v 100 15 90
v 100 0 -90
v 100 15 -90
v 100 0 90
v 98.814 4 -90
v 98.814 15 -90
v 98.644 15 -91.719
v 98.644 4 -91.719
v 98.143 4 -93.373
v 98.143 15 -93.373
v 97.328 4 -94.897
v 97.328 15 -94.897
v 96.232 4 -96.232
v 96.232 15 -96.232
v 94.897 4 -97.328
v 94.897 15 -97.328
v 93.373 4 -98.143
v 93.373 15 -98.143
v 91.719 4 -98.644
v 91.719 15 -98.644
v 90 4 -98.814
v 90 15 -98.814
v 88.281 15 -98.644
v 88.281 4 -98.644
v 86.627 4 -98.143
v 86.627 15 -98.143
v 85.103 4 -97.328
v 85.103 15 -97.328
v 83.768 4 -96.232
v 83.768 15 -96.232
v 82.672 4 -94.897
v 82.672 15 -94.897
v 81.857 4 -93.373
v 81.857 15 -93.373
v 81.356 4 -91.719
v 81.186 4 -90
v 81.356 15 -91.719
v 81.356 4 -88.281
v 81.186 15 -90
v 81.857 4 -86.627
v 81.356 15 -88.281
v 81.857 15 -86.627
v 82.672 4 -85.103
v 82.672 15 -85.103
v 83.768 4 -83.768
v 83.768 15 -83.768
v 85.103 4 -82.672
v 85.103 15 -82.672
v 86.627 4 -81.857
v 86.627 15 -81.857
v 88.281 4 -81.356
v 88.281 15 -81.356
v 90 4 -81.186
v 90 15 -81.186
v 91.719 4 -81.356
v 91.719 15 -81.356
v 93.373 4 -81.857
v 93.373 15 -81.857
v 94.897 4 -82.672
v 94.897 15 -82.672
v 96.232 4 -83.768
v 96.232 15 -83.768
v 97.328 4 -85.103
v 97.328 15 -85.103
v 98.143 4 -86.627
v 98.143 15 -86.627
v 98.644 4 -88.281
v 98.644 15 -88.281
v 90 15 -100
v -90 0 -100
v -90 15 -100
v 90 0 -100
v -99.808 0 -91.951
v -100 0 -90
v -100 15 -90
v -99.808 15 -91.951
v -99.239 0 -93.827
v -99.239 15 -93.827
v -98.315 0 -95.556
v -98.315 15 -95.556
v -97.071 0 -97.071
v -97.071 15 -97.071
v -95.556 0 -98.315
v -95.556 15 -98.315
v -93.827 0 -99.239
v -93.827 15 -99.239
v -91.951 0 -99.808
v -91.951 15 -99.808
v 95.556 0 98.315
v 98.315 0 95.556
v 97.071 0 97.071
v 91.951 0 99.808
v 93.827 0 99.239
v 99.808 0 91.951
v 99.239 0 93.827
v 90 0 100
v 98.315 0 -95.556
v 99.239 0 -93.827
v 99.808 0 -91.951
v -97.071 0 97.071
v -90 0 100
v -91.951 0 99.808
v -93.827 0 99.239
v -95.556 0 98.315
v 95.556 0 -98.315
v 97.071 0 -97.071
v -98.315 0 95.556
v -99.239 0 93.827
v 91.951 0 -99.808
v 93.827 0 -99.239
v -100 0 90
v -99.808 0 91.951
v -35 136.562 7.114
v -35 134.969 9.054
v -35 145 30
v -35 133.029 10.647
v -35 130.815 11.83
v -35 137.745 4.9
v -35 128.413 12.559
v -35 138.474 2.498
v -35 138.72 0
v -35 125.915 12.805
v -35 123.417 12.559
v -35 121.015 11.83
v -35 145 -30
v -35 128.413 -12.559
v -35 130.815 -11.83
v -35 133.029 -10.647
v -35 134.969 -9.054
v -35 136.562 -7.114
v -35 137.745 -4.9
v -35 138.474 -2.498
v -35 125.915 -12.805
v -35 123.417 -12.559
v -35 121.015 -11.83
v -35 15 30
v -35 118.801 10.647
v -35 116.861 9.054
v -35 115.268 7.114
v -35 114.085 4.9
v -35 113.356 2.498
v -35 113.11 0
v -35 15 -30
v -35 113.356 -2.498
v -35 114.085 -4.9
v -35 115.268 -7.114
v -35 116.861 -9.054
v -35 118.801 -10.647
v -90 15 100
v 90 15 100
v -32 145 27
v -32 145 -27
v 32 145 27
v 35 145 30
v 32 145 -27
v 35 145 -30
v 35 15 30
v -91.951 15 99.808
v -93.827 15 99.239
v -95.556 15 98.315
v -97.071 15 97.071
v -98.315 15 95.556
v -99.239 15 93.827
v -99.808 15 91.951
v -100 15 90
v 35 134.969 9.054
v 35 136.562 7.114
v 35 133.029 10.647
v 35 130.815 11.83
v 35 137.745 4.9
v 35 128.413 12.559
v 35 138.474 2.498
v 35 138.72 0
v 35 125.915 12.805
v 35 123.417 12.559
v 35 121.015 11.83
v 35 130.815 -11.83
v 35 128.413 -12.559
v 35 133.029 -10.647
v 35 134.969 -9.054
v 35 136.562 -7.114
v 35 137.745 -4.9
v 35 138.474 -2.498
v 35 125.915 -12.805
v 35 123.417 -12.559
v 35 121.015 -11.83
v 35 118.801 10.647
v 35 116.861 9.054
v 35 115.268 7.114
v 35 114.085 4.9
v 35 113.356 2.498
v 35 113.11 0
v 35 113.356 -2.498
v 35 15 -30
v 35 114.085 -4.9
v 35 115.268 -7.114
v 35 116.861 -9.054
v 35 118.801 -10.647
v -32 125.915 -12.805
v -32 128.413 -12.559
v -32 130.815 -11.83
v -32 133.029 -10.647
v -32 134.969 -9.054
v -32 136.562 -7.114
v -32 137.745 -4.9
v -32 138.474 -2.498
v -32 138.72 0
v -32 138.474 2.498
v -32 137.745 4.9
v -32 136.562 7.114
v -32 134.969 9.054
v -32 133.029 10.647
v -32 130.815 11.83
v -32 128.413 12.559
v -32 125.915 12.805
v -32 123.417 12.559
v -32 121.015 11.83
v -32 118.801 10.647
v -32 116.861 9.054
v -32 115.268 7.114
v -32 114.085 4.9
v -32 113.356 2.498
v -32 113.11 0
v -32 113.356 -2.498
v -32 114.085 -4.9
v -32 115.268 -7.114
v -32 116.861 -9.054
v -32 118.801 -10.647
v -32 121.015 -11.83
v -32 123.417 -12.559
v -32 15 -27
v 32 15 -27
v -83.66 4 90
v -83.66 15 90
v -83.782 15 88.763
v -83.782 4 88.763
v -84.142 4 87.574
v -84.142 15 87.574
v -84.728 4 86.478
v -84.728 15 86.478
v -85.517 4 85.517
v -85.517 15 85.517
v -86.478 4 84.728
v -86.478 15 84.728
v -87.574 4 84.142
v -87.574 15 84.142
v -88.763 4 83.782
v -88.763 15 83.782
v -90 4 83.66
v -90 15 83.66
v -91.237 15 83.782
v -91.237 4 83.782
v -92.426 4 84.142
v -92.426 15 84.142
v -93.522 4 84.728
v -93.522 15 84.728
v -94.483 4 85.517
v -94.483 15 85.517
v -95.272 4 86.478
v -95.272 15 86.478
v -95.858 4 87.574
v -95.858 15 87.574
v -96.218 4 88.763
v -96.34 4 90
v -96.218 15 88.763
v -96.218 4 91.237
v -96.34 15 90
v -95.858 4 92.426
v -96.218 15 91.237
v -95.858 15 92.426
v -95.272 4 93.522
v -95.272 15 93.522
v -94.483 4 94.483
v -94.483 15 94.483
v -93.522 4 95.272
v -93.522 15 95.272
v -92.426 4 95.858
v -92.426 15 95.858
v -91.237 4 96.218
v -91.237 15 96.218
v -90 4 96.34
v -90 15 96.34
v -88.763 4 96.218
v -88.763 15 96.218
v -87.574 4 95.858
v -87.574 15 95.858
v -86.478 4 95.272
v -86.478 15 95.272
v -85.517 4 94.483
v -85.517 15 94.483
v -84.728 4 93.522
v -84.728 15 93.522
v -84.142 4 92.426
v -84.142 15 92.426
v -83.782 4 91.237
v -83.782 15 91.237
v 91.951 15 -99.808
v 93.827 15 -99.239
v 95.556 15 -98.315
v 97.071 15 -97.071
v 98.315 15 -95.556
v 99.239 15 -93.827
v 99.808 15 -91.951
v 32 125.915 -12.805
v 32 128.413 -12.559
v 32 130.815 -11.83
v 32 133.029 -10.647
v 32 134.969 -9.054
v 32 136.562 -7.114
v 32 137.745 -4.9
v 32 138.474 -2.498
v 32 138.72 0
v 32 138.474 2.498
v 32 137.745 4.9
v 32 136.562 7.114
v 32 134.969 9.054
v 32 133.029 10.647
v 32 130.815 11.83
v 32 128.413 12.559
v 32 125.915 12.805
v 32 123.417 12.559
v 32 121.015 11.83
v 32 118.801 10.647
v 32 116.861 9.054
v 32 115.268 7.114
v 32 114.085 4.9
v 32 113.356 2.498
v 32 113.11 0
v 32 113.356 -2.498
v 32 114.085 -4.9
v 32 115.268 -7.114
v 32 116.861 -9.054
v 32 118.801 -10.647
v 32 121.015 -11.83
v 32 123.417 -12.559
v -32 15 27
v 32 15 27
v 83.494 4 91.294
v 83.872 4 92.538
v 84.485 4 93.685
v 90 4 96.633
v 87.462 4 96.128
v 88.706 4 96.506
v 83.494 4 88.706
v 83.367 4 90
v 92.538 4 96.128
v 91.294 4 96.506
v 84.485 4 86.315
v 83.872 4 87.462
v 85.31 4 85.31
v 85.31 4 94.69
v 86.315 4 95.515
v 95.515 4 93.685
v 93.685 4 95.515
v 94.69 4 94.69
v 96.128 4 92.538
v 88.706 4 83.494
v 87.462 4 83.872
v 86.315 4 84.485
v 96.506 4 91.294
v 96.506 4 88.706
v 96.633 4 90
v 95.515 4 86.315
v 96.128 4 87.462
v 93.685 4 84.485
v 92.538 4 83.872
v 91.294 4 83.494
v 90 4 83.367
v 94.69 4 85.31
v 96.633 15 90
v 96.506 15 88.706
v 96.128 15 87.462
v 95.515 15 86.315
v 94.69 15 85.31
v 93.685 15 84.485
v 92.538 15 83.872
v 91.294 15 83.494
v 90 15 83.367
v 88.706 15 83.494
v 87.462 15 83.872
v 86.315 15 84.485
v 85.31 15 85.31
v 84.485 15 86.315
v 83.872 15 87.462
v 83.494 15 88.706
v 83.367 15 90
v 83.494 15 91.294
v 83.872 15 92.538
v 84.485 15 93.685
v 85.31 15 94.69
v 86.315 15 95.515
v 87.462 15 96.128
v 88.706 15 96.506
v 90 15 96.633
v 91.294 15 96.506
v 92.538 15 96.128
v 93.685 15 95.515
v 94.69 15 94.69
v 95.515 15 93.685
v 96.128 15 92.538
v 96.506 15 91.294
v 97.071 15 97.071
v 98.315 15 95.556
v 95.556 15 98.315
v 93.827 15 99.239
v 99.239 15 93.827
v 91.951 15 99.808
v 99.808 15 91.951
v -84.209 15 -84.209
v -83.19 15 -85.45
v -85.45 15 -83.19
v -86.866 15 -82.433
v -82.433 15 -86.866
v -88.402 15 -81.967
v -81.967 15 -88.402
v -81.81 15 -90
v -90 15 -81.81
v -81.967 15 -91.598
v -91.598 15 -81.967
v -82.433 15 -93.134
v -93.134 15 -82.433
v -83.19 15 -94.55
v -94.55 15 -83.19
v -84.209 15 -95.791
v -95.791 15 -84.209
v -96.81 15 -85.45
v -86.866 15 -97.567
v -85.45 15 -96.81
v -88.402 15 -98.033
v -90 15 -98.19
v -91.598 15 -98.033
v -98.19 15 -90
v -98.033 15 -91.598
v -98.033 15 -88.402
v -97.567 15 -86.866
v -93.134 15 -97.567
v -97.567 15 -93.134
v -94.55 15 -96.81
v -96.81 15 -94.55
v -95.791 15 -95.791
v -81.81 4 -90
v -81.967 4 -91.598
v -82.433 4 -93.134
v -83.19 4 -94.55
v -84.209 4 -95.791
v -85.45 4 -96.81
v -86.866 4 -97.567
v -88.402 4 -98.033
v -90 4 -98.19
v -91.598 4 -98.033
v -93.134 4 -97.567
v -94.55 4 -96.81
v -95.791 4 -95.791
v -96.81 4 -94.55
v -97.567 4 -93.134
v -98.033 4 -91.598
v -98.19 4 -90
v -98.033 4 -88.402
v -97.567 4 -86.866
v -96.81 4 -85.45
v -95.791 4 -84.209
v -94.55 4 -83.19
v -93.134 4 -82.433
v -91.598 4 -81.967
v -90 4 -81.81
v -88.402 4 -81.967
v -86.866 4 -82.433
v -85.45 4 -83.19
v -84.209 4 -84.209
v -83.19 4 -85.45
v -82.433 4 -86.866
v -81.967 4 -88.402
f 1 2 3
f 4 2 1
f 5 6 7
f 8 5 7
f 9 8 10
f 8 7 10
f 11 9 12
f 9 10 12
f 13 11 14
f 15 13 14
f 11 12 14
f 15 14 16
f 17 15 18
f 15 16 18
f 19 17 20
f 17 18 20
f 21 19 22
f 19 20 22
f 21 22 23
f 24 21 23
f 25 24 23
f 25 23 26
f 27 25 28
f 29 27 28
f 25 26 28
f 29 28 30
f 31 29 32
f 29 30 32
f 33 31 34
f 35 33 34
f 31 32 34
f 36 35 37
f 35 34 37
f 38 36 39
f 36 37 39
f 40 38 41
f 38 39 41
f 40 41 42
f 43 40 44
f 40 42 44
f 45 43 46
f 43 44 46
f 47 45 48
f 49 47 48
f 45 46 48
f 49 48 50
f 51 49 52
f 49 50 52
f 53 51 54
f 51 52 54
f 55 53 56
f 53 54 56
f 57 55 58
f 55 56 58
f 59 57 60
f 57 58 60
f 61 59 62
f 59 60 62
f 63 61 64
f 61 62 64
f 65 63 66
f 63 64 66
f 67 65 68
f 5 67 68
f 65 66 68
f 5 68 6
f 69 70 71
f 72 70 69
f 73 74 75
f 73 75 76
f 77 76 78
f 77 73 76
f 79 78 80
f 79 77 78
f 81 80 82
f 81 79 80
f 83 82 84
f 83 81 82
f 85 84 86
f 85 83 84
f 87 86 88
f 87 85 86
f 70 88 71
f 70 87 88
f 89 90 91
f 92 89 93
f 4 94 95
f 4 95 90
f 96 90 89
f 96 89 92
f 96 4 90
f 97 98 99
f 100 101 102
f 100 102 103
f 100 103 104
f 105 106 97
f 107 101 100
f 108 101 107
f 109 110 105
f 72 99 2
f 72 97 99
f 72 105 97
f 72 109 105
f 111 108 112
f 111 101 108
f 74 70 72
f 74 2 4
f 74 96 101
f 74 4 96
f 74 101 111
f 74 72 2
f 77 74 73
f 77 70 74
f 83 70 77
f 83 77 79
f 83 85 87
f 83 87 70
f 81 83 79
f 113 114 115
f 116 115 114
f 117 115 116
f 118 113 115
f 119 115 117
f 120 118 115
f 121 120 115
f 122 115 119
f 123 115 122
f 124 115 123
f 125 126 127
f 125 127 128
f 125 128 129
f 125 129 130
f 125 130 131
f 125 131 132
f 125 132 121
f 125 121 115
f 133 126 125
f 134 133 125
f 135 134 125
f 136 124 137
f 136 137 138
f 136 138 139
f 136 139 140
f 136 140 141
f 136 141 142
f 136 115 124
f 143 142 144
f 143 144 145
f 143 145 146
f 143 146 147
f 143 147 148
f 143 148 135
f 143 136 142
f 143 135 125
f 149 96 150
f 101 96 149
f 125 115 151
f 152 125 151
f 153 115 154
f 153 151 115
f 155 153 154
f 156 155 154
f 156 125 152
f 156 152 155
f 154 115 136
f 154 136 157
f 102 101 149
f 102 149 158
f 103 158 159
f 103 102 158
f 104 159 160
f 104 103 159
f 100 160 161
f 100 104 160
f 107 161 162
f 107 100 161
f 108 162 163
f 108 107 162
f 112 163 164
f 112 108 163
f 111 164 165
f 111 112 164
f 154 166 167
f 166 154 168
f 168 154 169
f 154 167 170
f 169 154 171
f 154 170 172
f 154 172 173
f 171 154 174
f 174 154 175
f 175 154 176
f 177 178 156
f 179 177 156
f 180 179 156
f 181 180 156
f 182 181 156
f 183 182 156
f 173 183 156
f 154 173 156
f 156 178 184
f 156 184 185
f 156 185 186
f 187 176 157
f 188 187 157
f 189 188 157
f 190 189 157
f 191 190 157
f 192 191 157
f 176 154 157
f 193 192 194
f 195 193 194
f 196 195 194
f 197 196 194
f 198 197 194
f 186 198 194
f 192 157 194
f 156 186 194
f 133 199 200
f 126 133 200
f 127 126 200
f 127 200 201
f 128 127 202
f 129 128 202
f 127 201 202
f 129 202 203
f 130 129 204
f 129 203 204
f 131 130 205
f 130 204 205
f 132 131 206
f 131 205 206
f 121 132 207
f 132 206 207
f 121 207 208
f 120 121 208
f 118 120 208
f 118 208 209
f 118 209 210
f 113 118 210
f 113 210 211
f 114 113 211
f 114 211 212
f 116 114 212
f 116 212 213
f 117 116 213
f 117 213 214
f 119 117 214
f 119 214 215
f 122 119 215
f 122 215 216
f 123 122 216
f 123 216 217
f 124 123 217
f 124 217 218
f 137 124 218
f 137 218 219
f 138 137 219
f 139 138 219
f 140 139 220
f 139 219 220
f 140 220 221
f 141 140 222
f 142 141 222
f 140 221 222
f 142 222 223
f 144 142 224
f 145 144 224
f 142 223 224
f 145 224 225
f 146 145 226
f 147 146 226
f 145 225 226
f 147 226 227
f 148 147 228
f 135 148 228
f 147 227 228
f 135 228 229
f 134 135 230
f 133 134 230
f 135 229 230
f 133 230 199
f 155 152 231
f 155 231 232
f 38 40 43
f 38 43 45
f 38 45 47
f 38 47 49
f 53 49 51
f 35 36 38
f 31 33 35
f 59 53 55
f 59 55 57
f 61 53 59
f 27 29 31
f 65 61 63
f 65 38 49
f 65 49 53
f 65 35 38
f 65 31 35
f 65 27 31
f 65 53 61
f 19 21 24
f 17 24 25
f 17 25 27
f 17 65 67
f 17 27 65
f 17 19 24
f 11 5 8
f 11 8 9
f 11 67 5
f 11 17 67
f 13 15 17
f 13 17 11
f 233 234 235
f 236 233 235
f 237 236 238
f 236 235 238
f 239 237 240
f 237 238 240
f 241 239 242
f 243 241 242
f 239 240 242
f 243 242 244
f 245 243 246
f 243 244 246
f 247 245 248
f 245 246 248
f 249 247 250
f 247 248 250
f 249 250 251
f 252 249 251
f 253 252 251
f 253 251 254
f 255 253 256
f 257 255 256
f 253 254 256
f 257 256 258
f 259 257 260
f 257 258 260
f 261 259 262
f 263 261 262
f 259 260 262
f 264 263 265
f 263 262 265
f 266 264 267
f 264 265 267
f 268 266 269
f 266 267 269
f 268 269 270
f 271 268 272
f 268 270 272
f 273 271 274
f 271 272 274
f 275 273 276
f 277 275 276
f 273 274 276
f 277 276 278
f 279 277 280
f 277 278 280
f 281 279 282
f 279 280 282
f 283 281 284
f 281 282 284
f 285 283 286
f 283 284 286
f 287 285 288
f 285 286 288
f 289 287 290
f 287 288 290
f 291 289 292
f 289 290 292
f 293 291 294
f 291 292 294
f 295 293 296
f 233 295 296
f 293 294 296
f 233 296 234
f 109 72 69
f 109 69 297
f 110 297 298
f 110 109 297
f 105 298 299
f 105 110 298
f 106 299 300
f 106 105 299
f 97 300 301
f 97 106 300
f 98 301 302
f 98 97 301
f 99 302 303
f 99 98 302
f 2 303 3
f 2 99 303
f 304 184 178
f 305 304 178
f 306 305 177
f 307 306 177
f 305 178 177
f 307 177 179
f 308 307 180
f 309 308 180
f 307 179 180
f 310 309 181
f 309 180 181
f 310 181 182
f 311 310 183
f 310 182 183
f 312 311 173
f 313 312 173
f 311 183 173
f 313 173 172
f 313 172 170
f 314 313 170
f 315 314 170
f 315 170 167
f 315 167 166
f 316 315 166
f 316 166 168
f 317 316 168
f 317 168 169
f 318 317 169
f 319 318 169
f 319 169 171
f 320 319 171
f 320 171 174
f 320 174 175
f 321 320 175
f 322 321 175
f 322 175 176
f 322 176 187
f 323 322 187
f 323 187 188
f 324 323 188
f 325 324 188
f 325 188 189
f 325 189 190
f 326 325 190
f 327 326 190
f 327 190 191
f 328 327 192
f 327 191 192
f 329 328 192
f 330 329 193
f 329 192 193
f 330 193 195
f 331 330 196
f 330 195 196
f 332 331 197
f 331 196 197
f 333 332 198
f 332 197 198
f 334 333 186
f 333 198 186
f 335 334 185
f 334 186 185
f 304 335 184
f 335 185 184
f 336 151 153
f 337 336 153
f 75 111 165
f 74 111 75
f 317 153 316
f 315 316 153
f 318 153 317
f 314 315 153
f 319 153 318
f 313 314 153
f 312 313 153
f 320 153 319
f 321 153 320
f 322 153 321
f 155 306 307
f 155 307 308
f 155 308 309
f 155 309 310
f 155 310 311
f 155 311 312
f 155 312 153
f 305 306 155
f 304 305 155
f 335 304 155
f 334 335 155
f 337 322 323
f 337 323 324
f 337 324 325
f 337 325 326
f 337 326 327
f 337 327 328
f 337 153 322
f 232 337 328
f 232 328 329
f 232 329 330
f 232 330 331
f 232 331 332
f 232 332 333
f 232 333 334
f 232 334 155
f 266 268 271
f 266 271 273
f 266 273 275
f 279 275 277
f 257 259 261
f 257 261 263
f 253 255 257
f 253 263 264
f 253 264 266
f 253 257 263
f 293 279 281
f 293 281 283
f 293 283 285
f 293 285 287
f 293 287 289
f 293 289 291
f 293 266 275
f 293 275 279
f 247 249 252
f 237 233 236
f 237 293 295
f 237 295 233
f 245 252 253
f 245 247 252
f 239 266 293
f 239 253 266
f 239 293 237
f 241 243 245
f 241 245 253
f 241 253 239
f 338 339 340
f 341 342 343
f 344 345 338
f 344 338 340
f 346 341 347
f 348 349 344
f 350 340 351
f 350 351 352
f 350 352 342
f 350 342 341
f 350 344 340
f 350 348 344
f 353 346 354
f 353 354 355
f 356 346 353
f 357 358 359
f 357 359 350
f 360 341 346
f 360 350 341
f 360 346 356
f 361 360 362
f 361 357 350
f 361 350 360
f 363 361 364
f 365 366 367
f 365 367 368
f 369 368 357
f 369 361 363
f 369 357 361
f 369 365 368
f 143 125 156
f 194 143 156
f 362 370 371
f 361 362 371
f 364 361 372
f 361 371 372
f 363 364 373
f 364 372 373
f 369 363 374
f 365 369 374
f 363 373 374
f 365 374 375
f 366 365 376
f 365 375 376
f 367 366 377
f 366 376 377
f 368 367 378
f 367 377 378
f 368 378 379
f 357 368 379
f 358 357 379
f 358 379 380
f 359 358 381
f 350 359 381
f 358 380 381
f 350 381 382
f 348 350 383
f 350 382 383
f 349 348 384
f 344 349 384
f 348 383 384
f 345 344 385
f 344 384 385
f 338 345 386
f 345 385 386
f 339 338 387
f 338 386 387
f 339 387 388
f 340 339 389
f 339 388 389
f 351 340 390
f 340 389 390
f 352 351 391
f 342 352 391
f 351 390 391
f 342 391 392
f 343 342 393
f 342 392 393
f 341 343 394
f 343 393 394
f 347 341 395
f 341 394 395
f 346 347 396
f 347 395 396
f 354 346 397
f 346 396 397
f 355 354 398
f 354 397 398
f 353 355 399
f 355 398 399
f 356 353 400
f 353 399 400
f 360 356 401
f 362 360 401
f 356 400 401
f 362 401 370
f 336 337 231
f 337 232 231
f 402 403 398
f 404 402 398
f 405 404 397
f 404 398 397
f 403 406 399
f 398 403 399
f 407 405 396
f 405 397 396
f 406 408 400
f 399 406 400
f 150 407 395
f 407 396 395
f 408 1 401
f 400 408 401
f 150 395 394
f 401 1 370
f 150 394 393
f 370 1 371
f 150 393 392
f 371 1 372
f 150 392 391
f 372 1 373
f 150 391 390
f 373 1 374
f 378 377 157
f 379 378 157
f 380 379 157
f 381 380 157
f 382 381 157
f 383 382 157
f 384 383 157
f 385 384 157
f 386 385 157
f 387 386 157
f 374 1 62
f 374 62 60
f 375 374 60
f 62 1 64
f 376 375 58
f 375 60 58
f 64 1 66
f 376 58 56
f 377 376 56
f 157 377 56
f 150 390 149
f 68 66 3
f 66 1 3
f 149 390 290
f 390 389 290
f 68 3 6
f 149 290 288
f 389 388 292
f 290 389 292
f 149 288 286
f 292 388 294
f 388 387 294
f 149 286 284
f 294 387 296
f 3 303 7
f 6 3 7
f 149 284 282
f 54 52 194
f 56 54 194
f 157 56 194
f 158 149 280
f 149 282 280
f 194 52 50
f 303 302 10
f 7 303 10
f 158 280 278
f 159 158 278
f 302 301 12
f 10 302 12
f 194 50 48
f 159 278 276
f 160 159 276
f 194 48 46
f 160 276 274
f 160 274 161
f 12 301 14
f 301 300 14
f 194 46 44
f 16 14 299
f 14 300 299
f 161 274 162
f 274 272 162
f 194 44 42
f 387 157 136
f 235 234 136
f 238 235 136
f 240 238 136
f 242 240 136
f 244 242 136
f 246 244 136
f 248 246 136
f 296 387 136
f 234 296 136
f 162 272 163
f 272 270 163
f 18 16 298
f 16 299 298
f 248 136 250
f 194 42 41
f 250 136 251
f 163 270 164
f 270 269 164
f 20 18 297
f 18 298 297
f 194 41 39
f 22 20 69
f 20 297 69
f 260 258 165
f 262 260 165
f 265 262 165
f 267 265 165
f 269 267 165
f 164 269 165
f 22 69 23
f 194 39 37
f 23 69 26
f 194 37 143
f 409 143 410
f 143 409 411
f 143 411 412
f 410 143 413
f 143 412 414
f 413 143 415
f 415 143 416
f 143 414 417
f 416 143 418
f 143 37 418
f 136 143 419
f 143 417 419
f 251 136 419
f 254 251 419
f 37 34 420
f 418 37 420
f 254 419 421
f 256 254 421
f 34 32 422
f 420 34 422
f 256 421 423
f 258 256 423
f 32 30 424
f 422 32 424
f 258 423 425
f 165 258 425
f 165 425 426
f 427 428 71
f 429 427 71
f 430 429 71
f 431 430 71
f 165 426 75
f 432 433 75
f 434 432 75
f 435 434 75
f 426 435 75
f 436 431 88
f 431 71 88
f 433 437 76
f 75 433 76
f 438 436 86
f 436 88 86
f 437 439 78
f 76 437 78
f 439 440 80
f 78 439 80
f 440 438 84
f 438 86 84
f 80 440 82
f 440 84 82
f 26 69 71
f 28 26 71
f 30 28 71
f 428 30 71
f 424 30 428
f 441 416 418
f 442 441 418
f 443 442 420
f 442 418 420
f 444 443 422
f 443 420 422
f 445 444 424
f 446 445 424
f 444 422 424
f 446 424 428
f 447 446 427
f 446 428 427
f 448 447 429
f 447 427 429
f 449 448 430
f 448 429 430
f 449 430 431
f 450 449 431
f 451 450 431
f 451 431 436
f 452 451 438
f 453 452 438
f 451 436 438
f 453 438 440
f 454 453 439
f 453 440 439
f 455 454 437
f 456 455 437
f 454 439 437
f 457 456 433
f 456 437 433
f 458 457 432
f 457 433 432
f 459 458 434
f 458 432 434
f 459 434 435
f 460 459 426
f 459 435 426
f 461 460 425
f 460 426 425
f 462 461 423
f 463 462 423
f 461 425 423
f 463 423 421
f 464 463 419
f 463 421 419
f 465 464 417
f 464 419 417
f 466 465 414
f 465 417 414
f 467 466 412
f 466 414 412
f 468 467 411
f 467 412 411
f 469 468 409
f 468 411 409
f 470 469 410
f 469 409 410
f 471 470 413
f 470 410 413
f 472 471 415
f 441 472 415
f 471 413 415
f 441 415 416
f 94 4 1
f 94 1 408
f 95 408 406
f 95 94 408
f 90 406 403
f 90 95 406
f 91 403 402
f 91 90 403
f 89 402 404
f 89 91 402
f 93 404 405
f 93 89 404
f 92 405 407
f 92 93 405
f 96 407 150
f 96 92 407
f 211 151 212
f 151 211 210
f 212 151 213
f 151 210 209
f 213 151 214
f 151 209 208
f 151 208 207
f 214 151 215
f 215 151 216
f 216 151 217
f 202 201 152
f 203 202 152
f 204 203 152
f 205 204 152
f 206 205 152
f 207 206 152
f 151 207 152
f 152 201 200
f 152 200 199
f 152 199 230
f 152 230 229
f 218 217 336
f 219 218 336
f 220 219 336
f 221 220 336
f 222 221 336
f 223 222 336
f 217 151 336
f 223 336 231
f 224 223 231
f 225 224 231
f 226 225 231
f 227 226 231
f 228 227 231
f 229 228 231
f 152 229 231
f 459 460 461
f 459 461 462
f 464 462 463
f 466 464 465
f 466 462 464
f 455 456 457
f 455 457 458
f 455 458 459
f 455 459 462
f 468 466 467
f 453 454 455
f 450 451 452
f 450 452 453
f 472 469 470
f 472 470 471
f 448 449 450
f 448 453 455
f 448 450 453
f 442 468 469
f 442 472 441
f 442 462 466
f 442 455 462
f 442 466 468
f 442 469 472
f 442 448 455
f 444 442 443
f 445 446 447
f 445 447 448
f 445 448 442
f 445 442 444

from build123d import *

# Parameters (mm, degrees)
SALIENTE_EXTRUIR1_DEPTH = 15
CROQUIS2_W              = 70
CROQUIS2_H              = 60
CROQUIS2_W_2            = 64
CROQUIS2_H_2            = 54
SALIENTE_EXTRUIR2_DEPTH = 130
CROQUIS3_R              = 12.804907533
CORTAR_EXTRUIR1_DEPTH   = 88
CROQUIS4_R              = 8.190031249
CROQUIS4_R_2            = 8.81355523
CROQUIS4_R_3            = 6.340285024
CROQUIS4_R_4            = 6.633362886
CORTAR_EXTRUIR2_DEPTH   = 11


with BuildPart() as part:
    # Croquis1 → Saliente-Extruir1 (new body)
    with BuildSketch(Plane(origin=(0, 0, 0), x_dir=(1, 0, 0), z_dir=(0, 1, 0))):
        with BuildLine():
            Line((-90, 100), (90, 100))
            ThreePointArc((90, 100), (97.071067812, 97.071067812), (100, 90))
            Line((100, 90), (100, -90))
            ThreePointArc((100, -90), (97.071067812, -97.071067812), (90, -100))
            Line((90, -100), (-90, -100))
            ThreePointArc((-90, -100), (-97.071067812, -97.071067812), (-100, -90))
            Line((-100, -90), (-100, 90))
            ThreePointArc((-100, 90), (-97.071067812, 97.071067812), (-90, 100))
        make_face()
    extrude(amount=SALIENTE_EXTRUIR1_DEPTH)

    # Croquis2 → Saliente-Extruir2 (add)
    with BuildSketch(Plane(origin=(0, 15, 0), x_dir=(1, 0, 0), z_dir=(0, 1, 0))):
        Rectangle(CROQUIS2_W, CROQUIS2_H)
        Rectangle(CROQUIS2_W_2, CROQUIS2_H_2, mode=Mode.SUBTRACT)
    extrude(amount=SALIENTE_EXTRUIR2_DEPTH)

    # Croquis3 → Cortar-Extruir1 (cut)
    with BuildSketch(Plane(origin=(35, 0, 0), x_dir=(0, 0, -1), z_dir=(1, 0, 0))):
        with Locations((0, 125.915041201)):
            Circle(CROQUIS3_R)
    extrude(amount=-CORTAR_EXTRUIR1_DEPTH, mode=Mode.SUBTRACT)

    # Croquis4 → Cortar-Extruir2 (cut)
    with BuildSketch(Plane(origin=(0, 15, 0), x_dir=(1, 0, 0), z_dir=(0, 1, 0))):
        with Locations((-90, 90)):
            Circle(CROQUIS4_R)
        with Locations((90, 90)):
            Circle(CROQUIS4_R_2)
        with Locations((-90, -90)):
            Circle(CROQUIS4_R_3)
        with Locations((90, -90)):
            Circle(CROQUIS4_R_4)
    extrude(amount=-CORTAR_EXTRUIR2_DEPTH, mode=Mode.SUBTRACT)


solid = part.part
